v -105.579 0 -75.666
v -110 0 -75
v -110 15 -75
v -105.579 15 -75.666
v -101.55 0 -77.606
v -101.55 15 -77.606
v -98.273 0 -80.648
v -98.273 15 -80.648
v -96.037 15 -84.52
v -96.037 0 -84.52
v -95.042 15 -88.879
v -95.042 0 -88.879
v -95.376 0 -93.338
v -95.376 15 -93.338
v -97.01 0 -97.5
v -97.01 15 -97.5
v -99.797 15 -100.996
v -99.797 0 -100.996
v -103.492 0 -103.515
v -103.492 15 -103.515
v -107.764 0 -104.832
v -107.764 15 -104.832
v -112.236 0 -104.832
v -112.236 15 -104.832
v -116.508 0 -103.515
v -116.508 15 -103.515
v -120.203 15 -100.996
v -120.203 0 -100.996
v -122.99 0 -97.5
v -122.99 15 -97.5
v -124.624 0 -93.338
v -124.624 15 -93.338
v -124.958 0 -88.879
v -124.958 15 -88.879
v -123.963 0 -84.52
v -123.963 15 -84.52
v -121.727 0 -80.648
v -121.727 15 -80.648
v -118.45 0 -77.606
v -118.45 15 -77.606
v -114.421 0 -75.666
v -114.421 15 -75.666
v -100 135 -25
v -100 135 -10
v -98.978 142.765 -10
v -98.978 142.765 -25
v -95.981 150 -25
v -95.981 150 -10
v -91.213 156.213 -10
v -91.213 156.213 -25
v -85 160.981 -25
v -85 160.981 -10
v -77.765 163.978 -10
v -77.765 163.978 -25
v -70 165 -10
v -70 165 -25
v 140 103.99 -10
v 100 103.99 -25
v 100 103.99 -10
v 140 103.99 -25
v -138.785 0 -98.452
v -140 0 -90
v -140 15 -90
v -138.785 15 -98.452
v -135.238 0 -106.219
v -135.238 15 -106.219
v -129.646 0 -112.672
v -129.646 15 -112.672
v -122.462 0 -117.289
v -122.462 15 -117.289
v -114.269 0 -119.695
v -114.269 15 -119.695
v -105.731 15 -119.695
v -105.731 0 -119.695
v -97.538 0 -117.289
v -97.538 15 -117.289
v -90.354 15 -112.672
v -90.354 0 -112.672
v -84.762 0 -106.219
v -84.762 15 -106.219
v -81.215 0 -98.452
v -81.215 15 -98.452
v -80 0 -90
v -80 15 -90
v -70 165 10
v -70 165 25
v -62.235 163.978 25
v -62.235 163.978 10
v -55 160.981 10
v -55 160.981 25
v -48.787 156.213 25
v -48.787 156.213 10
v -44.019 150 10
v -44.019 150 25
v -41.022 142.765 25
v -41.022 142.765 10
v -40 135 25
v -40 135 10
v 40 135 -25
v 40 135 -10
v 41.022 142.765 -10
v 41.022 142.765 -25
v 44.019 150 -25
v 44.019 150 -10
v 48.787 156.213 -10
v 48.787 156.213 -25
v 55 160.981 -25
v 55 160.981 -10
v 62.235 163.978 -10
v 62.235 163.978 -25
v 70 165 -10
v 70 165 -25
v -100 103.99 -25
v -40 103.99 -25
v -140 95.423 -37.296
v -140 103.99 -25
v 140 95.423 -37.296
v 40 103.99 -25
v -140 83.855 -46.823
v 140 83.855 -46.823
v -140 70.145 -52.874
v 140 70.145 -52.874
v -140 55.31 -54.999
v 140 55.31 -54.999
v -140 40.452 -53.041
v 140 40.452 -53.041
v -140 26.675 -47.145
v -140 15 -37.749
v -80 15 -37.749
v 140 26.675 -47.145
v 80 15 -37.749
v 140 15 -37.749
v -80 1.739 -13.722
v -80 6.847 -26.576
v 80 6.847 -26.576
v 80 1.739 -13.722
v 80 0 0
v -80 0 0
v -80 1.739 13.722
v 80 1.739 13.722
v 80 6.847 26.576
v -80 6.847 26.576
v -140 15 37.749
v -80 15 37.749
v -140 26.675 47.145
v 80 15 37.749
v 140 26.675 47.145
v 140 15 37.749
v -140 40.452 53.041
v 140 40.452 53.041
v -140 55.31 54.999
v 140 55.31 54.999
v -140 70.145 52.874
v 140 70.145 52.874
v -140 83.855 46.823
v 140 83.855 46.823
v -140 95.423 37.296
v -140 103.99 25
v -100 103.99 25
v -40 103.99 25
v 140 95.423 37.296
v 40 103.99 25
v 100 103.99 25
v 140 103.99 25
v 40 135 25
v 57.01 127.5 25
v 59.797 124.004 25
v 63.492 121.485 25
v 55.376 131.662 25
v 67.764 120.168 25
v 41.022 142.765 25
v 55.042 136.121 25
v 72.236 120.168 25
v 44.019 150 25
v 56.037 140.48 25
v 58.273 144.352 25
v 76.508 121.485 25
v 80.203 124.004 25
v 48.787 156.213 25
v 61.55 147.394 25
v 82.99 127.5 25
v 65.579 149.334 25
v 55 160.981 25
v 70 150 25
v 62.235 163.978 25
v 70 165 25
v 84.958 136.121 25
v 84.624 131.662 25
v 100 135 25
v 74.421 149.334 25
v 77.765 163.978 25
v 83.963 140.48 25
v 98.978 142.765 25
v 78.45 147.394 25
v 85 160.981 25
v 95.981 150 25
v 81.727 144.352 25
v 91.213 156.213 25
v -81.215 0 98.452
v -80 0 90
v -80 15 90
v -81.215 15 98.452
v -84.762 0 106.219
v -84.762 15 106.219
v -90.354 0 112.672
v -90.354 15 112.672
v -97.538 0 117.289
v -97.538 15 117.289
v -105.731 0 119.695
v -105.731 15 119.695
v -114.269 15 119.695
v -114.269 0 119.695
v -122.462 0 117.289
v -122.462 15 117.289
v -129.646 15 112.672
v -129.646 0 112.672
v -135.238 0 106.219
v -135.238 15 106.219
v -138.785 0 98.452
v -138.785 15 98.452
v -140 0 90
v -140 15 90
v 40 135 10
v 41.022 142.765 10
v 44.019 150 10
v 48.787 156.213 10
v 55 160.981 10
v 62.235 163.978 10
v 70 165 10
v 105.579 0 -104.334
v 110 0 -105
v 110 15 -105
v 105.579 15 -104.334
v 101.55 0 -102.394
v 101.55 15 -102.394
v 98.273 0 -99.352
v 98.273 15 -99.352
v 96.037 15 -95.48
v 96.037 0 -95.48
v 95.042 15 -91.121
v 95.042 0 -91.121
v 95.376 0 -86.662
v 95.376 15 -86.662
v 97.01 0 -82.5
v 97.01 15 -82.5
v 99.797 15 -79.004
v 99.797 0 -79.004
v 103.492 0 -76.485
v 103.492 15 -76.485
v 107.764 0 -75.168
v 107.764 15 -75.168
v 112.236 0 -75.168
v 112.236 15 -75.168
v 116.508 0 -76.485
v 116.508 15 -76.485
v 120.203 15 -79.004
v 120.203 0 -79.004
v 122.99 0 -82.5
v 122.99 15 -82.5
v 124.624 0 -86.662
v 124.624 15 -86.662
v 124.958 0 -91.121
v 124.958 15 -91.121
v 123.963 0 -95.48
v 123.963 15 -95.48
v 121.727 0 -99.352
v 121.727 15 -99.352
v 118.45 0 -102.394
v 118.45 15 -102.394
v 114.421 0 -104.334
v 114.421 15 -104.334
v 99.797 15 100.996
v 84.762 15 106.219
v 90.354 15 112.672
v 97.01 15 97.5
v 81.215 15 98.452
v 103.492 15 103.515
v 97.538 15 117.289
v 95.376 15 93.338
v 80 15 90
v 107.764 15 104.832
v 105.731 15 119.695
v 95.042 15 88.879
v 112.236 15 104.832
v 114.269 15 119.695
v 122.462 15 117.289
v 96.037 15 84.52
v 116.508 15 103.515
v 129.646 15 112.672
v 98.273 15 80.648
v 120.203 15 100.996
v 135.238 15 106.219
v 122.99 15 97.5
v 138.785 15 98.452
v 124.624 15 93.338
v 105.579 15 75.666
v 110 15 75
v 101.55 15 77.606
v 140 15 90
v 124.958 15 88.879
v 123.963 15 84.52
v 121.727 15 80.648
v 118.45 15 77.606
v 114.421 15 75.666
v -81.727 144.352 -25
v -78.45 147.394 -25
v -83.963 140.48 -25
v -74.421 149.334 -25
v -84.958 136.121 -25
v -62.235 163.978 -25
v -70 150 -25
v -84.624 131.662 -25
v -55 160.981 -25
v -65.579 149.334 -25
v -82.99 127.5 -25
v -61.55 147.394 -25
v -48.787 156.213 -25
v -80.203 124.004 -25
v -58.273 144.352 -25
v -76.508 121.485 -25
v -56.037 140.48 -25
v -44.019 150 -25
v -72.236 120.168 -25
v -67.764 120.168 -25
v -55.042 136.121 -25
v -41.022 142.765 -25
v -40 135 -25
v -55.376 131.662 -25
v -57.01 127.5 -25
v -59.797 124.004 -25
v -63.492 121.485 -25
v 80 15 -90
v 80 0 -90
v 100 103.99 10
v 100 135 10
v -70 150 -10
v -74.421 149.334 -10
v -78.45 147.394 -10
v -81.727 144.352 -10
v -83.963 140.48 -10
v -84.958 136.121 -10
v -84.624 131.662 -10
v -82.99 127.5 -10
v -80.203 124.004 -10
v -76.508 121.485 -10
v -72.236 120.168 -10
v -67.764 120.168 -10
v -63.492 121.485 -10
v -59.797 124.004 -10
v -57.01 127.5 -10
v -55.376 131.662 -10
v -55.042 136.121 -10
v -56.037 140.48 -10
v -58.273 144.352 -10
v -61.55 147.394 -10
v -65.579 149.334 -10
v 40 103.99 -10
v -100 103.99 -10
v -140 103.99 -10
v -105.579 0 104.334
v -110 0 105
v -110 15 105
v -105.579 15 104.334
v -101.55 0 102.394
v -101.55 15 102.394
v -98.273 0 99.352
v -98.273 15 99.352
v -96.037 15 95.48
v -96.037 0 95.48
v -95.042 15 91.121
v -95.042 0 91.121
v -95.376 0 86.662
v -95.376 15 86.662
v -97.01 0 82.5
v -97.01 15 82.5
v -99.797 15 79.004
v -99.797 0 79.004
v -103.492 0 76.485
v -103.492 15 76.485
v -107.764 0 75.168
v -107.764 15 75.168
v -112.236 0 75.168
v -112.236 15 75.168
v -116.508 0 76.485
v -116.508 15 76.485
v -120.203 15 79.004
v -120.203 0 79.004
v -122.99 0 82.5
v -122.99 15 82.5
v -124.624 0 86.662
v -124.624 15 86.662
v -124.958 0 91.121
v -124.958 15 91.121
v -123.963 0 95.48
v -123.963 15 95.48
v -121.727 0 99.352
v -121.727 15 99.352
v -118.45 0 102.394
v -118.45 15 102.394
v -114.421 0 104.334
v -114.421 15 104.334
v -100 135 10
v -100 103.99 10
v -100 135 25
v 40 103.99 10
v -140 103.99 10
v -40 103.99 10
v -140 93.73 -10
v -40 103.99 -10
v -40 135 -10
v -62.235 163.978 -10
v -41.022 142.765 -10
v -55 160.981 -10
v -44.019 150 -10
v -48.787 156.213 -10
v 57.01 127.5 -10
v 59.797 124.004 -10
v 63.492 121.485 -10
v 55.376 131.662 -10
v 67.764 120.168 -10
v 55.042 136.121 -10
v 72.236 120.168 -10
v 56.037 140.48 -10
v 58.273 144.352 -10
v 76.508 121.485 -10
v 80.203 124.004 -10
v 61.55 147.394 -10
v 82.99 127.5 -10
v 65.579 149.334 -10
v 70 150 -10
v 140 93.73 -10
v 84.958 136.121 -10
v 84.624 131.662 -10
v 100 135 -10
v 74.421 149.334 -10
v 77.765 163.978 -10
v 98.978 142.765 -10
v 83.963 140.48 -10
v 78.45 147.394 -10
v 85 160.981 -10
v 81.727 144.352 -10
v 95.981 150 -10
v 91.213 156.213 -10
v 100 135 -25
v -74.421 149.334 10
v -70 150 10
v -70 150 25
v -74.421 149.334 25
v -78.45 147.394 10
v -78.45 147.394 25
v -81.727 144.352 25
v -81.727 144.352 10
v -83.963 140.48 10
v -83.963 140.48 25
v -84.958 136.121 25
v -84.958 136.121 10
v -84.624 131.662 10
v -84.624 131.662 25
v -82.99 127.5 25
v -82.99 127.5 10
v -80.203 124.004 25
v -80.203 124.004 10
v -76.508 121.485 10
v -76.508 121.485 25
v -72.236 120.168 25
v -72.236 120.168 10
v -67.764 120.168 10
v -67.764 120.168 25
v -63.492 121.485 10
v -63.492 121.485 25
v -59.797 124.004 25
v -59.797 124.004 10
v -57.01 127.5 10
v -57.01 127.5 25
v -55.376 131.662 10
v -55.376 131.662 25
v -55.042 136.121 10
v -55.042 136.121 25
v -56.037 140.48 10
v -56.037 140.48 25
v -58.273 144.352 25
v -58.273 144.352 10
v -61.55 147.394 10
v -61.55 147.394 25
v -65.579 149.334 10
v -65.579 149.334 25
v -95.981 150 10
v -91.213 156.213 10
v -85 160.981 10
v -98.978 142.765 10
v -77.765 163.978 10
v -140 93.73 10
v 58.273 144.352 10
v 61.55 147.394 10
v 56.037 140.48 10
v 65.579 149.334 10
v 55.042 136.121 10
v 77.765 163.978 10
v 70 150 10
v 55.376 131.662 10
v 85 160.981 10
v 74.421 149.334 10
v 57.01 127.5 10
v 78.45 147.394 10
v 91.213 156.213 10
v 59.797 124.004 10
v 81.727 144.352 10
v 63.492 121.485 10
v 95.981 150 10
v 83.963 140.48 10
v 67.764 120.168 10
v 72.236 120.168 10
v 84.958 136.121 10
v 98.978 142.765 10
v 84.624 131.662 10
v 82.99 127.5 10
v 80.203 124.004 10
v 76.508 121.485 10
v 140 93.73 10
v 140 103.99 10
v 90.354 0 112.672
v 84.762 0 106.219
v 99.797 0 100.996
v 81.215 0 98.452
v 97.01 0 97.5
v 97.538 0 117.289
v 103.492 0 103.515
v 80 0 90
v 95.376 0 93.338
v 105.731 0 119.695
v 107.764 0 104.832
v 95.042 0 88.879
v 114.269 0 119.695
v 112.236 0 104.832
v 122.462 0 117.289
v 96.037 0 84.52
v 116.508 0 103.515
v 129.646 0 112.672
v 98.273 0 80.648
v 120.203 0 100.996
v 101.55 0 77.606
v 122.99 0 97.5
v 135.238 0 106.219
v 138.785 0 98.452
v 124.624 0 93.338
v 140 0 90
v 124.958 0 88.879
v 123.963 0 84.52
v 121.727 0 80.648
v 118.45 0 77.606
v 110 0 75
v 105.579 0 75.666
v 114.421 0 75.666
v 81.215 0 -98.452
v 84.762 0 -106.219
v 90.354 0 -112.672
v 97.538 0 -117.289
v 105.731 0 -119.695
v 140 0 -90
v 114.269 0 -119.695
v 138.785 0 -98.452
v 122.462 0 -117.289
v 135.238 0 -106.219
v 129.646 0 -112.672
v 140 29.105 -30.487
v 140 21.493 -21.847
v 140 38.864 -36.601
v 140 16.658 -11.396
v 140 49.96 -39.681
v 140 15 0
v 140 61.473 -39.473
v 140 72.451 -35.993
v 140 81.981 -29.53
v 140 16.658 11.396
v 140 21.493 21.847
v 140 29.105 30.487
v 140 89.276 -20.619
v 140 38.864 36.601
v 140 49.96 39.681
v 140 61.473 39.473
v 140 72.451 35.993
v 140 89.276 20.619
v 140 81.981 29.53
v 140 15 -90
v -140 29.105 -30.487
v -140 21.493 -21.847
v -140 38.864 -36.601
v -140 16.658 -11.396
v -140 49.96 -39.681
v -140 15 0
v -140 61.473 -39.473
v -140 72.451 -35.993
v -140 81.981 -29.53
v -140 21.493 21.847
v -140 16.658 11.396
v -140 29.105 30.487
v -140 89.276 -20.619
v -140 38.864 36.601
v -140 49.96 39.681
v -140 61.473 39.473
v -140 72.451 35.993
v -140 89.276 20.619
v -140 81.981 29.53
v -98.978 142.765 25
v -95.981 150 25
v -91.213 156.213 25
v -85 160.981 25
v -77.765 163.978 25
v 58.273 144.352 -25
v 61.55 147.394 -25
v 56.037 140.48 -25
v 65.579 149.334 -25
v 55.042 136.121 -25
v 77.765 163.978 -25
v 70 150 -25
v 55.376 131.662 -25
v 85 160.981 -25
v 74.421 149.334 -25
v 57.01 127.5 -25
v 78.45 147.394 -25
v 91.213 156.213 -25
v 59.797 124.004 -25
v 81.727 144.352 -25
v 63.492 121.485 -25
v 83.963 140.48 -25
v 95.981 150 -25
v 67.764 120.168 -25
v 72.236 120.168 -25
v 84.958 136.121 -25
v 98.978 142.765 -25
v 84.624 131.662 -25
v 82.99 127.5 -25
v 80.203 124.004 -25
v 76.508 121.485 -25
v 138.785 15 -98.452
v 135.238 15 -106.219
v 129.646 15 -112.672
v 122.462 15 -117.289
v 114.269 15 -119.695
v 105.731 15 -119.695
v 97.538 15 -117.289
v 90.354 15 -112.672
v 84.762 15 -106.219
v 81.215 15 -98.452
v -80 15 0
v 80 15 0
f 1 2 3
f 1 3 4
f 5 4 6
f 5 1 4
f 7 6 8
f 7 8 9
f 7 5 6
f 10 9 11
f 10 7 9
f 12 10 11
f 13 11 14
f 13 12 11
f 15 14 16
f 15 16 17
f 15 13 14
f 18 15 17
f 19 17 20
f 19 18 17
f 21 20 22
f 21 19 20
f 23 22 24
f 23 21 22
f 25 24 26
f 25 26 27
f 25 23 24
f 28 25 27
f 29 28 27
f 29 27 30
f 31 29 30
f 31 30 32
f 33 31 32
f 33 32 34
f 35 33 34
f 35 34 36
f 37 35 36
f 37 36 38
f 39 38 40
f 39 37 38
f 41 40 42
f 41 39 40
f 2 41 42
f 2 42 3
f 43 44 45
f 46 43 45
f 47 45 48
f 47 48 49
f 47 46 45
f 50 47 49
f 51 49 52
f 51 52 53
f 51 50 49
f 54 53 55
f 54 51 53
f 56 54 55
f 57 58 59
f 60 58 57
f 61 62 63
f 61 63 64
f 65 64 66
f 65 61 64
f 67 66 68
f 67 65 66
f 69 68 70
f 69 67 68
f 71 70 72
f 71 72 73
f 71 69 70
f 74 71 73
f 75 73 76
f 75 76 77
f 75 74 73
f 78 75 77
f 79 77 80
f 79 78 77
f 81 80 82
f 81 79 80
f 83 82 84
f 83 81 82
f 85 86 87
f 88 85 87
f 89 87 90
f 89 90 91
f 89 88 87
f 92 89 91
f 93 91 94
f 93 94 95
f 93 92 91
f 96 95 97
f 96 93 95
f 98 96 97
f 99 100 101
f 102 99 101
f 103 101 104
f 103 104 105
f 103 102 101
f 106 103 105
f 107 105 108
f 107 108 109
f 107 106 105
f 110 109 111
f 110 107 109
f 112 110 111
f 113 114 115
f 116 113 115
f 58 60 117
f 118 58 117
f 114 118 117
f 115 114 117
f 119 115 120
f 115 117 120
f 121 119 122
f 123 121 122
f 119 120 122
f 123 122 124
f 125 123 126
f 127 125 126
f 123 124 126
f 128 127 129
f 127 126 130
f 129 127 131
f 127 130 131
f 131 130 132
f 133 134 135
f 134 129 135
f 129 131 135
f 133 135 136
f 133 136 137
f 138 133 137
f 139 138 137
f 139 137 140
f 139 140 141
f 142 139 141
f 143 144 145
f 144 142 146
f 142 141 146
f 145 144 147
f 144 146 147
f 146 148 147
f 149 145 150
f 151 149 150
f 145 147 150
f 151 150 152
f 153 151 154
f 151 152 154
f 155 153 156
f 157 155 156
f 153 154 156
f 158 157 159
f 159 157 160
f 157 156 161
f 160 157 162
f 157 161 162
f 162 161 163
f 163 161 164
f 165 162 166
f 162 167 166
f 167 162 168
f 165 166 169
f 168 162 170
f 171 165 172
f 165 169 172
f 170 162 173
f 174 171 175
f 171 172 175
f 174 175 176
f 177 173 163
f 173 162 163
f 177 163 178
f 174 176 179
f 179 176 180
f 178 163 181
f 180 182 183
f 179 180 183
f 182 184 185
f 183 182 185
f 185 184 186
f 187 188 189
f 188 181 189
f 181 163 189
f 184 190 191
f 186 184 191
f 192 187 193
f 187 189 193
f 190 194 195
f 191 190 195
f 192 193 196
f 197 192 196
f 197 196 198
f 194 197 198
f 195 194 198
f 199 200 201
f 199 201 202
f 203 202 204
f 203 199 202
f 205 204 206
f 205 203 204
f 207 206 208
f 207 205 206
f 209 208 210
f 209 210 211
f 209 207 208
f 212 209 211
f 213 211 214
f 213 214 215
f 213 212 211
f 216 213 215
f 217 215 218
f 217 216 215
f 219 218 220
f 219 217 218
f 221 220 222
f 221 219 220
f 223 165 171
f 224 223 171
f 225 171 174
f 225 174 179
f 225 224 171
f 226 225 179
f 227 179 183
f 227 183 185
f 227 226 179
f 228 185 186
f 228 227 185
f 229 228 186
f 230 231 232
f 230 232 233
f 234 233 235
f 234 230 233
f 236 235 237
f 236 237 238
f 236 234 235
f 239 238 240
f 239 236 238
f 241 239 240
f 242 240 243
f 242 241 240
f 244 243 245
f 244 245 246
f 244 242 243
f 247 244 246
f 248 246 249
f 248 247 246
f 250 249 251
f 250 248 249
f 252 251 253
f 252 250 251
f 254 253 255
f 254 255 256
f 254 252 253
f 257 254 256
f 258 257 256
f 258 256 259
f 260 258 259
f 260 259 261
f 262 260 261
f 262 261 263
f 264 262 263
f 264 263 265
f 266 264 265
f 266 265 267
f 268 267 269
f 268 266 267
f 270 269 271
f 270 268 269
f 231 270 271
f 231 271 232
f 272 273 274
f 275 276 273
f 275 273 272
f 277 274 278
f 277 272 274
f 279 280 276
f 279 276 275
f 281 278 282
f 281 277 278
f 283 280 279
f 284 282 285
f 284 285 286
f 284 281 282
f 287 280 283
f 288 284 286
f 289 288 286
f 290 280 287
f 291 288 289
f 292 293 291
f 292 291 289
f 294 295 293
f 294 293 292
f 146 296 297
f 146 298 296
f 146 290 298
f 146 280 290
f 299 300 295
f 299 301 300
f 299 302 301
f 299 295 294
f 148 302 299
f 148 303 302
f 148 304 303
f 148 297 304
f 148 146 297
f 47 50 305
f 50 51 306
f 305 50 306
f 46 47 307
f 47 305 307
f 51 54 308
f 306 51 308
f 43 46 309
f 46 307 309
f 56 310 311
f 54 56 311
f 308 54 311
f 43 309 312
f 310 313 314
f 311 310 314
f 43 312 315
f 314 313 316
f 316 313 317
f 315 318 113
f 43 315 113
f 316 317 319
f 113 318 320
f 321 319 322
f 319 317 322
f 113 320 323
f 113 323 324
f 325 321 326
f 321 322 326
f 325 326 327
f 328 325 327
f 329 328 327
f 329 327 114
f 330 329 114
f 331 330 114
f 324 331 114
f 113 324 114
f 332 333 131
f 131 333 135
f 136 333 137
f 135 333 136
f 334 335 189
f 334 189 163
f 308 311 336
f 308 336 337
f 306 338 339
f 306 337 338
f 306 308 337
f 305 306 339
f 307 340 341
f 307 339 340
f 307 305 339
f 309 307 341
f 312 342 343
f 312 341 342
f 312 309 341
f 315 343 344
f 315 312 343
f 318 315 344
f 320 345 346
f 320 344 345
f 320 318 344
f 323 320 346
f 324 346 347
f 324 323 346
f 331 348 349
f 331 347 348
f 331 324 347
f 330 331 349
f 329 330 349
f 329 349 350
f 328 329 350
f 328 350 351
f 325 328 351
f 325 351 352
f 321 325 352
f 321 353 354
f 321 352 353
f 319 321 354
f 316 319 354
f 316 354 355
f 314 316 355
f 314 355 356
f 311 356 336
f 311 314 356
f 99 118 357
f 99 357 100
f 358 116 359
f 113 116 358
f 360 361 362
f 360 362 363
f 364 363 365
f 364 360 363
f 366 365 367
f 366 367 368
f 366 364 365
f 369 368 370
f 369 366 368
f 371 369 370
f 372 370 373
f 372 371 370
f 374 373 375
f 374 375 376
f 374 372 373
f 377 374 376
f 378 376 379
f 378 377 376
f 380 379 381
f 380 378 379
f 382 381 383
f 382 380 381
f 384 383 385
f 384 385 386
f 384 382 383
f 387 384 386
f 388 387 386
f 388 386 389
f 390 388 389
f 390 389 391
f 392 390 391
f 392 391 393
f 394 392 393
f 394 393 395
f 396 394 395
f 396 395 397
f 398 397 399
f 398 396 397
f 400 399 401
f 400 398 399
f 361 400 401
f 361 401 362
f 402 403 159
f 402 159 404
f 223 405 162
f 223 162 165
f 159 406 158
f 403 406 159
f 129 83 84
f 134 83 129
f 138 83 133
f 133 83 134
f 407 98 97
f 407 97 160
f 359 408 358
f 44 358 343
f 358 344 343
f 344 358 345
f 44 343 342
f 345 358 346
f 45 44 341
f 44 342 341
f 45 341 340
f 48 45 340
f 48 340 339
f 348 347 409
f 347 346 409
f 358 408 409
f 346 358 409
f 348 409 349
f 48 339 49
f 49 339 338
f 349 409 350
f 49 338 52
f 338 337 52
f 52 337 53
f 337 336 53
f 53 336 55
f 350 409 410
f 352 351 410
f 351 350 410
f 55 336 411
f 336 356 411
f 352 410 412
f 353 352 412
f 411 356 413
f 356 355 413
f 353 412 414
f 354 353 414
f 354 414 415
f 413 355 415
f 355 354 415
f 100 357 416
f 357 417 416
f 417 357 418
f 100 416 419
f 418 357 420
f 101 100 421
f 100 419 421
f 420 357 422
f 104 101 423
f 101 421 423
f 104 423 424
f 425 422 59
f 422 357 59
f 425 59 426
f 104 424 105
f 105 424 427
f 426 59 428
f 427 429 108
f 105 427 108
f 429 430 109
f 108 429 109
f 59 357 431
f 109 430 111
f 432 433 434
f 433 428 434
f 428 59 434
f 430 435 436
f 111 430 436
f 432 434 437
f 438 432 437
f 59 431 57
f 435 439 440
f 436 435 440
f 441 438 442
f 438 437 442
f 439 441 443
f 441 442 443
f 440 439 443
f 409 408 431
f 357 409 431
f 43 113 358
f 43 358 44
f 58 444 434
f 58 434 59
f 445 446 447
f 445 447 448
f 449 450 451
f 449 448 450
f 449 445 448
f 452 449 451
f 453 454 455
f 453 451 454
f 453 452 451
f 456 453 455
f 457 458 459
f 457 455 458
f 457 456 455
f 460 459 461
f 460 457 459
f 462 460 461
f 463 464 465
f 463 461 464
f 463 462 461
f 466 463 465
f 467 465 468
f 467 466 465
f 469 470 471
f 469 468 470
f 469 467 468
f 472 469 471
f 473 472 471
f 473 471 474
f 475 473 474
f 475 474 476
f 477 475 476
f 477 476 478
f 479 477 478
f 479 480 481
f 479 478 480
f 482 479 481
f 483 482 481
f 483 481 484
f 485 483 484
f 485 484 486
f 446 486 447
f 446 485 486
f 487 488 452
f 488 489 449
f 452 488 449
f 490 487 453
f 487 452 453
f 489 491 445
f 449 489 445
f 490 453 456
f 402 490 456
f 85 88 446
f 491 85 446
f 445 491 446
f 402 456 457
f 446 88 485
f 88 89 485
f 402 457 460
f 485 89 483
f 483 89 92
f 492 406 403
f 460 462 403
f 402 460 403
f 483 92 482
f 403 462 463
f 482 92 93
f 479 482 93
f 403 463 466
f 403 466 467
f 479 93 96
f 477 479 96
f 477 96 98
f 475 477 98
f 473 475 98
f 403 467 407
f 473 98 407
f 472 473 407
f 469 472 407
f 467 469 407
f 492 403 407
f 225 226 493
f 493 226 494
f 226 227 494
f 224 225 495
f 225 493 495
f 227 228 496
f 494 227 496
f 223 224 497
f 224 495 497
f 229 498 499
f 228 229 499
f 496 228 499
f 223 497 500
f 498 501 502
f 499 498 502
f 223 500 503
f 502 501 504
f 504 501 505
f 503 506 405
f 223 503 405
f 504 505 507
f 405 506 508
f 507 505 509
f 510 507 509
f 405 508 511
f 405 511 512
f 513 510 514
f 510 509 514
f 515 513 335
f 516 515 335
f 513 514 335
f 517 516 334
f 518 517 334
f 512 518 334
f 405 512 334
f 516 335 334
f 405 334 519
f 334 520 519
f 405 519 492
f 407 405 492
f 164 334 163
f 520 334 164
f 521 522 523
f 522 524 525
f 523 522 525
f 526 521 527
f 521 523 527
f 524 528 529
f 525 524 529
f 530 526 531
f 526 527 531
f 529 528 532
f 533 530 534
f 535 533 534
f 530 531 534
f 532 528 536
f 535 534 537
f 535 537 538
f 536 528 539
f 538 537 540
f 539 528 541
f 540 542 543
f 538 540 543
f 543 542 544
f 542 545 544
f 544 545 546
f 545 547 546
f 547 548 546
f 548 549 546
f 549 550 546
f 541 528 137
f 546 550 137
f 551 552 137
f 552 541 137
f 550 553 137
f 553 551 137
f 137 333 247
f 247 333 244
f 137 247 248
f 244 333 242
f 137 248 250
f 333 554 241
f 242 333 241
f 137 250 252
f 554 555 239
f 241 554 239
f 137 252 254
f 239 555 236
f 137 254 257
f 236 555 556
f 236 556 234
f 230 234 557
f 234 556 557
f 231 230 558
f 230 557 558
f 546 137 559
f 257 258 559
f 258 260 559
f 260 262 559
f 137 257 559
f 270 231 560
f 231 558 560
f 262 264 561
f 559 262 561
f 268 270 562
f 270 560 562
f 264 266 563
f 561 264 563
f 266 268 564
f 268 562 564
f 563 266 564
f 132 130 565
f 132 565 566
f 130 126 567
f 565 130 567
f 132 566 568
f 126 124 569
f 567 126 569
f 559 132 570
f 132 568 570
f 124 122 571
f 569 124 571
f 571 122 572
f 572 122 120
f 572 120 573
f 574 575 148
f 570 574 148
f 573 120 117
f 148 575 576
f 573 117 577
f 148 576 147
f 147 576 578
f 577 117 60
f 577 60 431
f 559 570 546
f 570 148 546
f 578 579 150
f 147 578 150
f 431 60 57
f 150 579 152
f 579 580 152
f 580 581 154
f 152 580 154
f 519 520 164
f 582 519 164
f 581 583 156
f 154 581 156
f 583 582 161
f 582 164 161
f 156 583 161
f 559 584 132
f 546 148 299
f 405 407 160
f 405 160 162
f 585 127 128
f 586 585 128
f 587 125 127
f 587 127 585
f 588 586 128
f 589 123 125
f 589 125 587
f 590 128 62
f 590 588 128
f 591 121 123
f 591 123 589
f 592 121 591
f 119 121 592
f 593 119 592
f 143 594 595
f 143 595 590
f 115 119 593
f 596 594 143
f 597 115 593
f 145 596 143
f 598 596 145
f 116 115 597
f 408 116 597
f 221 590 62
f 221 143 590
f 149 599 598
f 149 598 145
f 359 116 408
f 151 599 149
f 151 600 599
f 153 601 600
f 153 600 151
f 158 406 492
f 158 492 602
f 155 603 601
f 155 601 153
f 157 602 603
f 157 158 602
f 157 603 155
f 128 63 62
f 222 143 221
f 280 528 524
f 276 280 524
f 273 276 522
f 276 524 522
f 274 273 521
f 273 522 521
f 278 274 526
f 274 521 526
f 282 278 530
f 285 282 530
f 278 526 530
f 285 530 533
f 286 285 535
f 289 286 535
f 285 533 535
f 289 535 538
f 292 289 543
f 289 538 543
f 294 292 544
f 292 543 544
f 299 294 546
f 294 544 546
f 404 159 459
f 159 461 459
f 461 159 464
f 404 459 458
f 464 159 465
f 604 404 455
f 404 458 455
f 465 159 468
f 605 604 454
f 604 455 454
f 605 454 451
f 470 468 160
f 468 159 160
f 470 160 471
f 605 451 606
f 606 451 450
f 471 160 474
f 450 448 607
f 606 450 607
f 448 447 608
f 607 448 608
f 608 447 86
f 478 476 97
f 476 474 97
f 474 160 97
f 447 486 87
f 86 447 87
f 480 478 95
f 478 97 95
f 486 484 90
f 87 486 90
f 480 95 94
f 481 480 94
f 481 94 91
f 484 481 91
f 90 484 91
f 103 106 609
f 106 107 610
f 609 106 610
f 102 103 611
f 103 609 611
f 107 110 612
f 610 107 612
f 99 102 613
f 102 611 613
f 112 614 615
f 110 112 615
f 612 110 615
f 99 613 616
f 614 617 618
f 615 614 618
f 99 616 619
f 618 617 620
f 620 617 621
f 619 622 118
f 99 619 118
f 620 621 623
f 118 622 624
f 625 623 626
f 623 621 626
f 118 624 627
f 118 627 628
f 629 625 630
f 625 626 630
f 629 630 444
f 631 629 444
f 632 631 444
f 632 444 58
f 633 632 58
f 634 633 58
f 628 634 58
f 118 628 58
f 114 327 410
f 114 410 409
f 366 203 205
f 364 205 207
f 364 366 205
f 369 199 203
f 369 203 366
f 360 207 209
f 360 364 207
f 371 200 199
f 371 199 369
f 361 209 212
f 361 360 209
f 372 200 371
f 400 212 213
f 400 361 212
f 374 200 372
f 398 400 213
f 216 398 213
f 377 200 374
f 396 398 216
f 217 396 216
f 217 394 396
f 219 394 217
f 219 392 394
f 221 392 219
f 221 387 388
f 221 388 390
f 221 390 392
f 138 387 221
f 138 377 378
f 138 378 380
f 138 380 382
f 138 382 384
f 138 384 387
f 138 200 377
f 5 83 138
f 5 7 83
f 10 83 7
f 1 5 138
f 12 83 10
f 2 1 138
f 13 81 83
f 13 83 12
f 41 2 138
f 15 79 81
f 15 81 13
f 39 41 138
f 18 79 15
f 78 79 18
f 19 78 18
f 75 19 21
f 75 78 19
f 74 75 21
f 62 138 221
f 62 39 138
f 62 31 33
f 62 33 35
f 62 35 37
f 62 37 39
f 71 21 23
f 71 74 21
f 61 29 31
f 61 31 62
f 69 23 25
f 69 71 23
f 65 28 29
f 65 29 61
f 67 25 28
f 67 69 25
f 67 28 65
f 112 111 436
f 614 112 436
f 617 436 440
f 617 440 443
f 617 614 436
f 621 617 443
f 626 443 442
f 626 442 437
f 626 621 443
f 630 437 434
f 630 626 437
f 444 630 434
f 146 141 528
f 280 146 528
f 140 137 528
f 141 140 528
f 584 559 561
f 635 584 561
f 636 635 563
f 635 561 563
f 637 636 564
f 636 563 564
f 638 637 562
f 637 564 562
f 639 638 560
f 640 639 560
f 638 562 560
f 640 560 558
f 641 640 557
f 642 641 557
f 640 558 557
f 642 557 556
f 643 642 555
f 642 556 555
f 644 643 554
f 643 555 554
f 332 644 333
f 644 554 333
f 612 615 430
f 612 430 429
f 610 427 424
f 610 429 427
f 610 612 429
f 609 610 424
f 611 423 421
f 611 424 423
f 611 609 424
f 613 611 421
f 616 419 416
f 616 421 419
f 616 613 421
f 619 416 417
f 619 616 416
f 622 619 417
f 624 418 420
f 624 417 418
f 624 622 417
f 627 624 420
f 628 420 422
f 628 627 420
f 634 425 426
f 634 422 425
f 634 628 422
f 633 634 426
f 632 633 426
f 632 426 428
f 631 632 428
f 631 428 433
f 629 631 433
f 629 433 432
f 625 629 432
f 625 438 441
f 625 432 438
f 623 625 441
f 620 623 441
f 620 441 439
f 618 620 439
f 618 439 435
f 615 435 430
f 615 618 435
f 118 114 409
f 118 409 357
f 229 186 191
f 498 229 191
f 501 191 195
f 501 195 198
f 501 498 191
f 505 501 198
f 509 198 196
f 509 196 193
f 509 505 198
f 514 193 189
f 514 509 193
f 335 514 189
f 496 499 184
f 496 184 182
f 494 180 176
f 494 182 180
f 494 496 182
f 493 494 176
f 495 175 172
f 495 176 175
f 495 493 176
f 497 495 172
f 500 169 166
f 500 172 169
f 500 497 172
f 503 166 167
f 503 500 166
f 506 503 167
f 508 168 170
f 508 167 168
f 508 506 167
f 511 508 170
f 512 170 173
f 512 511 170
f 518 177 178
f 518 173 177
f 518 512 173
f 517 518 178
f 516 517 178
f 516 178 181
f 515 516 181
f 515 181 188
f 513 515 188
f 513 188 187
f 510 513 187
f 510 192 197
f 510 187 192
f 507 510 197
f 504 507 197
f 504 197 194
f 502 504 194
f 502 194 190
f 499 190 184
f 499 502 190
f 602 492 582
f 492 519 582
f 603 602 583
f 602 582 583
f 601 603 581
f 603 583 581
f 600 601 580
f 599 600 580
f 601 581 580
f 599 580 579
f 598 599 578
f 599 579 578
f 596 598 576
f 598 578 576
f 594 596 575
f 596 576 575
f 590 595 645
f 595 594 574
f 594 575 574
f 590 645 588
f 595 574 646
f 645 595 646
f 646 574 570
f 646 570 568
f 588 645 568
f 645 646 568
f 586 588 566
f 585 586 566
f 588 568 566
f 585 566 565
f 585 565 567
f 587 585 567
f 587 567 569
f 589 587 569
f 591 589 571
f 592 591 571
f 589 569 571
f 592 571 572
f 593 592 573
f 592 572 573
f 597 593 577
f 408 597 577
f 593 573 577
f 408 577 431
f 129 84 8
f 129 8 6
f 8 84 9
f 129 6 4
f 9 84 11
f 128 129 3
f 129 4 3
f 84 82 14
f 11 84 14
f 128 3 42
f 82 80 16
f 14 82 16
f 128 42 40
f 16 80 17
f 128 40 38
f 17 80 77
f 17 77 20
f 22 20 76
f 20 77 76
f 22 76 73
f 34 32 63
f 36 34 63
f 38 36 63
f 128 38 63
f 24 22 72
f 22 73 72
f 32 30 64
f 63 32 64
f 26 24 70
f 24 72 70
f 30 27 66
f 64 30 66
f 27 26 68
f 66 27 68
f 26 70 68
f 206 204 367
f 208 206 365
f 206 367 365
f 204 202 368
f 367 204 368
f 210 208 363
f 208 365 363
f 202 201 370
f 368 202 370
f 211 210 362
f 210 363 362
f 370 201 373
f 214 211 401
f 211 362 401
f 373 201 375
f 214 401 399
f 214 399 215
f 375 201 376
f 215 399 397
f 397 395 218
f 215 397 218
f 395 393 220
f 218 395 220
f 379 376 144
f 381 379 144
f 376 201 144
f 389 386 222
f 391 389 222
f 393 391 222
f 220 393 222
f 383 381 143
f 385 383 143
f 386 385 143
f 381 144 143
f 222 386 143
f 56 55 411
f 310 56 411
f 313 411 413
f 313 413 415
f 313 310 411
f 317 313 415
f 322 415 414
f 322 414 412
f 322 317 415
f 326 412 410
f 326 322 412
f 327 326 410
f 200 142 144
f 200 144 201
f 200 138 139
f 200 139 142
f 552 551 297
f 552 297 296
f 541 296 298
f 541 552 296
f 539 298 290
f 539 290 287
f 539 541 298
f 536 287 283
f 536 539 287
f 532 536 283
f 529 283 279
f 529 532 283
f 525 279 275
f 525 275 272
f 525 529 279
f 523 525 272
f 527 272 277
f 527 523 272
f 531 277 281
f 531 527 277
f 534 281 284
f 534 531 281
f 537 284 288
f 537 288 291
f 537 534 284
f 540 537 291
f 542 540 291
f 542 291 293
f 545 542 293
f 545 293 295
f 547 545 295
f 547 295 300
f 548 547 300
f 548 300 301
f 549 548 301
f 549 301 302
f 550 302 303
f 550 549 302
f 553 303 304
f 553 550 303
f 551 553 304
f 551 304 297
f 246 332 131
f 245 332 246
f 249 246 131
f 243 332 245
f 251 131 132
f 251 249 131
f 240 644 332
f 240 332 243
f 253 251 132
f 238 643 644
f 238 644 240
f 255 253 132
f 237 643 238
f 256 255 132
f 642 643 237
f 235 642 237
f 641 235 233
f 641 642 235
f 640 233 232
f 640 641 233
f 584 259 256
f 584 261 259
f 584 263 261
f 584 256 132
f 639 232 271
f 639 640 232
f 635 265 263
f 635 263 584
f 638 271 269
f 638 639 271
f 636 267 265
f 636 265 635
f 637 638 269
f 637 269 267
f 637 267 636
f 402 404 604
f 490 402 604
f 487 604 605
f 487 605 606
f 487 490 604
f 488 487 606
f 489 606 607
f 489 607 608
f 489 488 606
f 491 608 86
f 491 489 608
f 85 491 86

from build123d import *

# Parameters (mm, degrees)
SKETCH2_R               = 15
BOSS_EXTRUDE1_DEPTH     = 15
BOSS_EXTRUDE1_2_DEPTH   = 15
BOSS_EXTRUDE2_DEPTH     = 140
CUT_EXTRUDE2_DEPTH      = 261.480325553
CUT_EXTRUDE2_DEPTH_BACK = 261.480325553
SKETCH4_R               = 15


with BuildPart() as part:
    # Sketch2 → Boss-Extrude1 (new body)
    with BuildSketch(Plane(origin=(0, 0, 0), x_dir=(1, 0, 0), z_dir=(0, 1, 0))):
        with BuildLine():
            Line((-140, -90), (-140, 90))
            ThreePointArc((-140, 90), (-110, 120), (-80, 90))
            Line((-80, 90), (-80, -90))
            ThreePointArc((-80, -90), (-110, -120), (-140, -90))
        make_face()
        with Locations(Location((-110, 90, 0), (0, 0, 270))):
            Circle(SKETCH2_R, mode=Mode.SUBTRACT)
        with Locations(Location((-110, -90, 0), (0, 0, 270))):
            Circle(SKETCH2_R, mode=Mode.SUBTRACT)
    extrude(amount=BOSS_EXTRUDE1_DEPTH)



with BuildPart() as body_2:
    # Sketch2 → Boss-Extrude1 2 (new body)
    with BuildSketch(Plane(origin=(0, 0, 0), x_dir=(1, 0, 0), z_dir=(0, 1, 0))):
        with BuildLine():
            Line((140, -90), (140, 90))
            ThreePointArc((140, 90), (110, 120), (80, 90))
            Line((80, 90), (80, -90))
            ThreePointArc((80, -90), (110, -120), (140, -90))
        make_face()
        with Locations(Location((110, -90, 0), (0, 0, 90))):
            Circle(SKETCH2_R, mode=Mode.SUBTRACT)
        with Locations(Location((110, 90, 0), (0, 0, 90))):
            Circle(SKETCH2_R, mode=Mode.SUBTRACT)
    extrude(amount=BOSS_EXTRUDE1_2_DEPTH)


with BuildPart() as part_1:
    add(part.part)

    add(body_2.part)  # Boss-Extrude2 merges body 2
    # Sketch3 → Boss-Extrude2 (add, symmetric)
    with BuildSketch(Plane(origin=(0, 0, 0), x_dir=(0, 0, -1), z_dir=(1, 0, 0))):
        with BuildLine():
            Line((-10, 165), (-10, 93.729833462))
            ThreePointArc((-10, 93.729833462), (0, 15), (10, 93.729833462))
            Line((10, 93.729833462), (10, 165))
            Line((10, 165), (25, 165))
            Line((25, 165), (25, 103.989794856))
            ThreePointArc((25, 103.989794856), (0, 0), (-25, 103.989794856))
            Line((-25, 103.989794856), (-25, 165))
            Line((-25, 165), (-10, 165))
        make_face()
    extrude(amount=BOSS_EXTRUDE2_DEPTH, both=True)

    # Sketch4 → Cut-Extrude2 (cut, two sides: drawn at the far end of the back side and taken through both)
    with BuildSketch(Plane.XY.offset(25).offset(-CUT_EXTRUDE2_DEPTH_BACK)):
        with BuildLine():
            Line((-140, 165), (-140, 103.989794856))
            Line((-140, 103.989794856), (-100, 103.989794856))
            Line((-100, 103.989794856), (-100, 135))
            ThreePointArc((-100, 135), (-91.213203436, 156.213203436), (-70, 165))
            Line((-70, 165), (-140, 165))
        make_face()
        with Locations(Location((-70, 135, 0), (0, 0, 90))):
            Circle(SKETCH4_R)
        with BuildLine():
            Line((-40, 135), (-40, 103.989794856))
            Line((-40, 103.989794856), (0, 103.989794856))
            Line((0, 103.989794856), (0, 165))
            Line((0, 165), (-70, 165))
            ThreePointArc((-70, 165), (-48.786796564, 156.213203436), (-40, 135))
        make_face()
        with BuildLine():
            Line((0, 165), (0, 103.989794856))
            Line((0, 103.989794856), (40, 103.989794856))
            Line((40, 103.989794856), (40, 135))
            ThreePointArc((40, 135), (48.786796564, 156.213203436), (70, 165))
            Line((70, 165), (0, 165))
        make_face()
        with Locations(Location((70, 135, 0), (0, 0, 90))):
            Circle(SKETCH4_R)
        with BuildLine():
            Line((140, 165), (70, 165))
            ThreePointArc((70, 165), (91.213203436, 156.213203436), (100, 135))
            Line((100, 135), (100, 103.989794856))
            Line((100, 103.989794856), (140, 103.989794856))
            Line((140, 103.989794856), (140, 165))
        make_face()
    extrude(amount=CUT_EXTRUDE2_DEPTH + CUT_EXTRUDE2_DEPTH_BACK, mode=Mode.SUBTRACT)


solid = part_1.part
